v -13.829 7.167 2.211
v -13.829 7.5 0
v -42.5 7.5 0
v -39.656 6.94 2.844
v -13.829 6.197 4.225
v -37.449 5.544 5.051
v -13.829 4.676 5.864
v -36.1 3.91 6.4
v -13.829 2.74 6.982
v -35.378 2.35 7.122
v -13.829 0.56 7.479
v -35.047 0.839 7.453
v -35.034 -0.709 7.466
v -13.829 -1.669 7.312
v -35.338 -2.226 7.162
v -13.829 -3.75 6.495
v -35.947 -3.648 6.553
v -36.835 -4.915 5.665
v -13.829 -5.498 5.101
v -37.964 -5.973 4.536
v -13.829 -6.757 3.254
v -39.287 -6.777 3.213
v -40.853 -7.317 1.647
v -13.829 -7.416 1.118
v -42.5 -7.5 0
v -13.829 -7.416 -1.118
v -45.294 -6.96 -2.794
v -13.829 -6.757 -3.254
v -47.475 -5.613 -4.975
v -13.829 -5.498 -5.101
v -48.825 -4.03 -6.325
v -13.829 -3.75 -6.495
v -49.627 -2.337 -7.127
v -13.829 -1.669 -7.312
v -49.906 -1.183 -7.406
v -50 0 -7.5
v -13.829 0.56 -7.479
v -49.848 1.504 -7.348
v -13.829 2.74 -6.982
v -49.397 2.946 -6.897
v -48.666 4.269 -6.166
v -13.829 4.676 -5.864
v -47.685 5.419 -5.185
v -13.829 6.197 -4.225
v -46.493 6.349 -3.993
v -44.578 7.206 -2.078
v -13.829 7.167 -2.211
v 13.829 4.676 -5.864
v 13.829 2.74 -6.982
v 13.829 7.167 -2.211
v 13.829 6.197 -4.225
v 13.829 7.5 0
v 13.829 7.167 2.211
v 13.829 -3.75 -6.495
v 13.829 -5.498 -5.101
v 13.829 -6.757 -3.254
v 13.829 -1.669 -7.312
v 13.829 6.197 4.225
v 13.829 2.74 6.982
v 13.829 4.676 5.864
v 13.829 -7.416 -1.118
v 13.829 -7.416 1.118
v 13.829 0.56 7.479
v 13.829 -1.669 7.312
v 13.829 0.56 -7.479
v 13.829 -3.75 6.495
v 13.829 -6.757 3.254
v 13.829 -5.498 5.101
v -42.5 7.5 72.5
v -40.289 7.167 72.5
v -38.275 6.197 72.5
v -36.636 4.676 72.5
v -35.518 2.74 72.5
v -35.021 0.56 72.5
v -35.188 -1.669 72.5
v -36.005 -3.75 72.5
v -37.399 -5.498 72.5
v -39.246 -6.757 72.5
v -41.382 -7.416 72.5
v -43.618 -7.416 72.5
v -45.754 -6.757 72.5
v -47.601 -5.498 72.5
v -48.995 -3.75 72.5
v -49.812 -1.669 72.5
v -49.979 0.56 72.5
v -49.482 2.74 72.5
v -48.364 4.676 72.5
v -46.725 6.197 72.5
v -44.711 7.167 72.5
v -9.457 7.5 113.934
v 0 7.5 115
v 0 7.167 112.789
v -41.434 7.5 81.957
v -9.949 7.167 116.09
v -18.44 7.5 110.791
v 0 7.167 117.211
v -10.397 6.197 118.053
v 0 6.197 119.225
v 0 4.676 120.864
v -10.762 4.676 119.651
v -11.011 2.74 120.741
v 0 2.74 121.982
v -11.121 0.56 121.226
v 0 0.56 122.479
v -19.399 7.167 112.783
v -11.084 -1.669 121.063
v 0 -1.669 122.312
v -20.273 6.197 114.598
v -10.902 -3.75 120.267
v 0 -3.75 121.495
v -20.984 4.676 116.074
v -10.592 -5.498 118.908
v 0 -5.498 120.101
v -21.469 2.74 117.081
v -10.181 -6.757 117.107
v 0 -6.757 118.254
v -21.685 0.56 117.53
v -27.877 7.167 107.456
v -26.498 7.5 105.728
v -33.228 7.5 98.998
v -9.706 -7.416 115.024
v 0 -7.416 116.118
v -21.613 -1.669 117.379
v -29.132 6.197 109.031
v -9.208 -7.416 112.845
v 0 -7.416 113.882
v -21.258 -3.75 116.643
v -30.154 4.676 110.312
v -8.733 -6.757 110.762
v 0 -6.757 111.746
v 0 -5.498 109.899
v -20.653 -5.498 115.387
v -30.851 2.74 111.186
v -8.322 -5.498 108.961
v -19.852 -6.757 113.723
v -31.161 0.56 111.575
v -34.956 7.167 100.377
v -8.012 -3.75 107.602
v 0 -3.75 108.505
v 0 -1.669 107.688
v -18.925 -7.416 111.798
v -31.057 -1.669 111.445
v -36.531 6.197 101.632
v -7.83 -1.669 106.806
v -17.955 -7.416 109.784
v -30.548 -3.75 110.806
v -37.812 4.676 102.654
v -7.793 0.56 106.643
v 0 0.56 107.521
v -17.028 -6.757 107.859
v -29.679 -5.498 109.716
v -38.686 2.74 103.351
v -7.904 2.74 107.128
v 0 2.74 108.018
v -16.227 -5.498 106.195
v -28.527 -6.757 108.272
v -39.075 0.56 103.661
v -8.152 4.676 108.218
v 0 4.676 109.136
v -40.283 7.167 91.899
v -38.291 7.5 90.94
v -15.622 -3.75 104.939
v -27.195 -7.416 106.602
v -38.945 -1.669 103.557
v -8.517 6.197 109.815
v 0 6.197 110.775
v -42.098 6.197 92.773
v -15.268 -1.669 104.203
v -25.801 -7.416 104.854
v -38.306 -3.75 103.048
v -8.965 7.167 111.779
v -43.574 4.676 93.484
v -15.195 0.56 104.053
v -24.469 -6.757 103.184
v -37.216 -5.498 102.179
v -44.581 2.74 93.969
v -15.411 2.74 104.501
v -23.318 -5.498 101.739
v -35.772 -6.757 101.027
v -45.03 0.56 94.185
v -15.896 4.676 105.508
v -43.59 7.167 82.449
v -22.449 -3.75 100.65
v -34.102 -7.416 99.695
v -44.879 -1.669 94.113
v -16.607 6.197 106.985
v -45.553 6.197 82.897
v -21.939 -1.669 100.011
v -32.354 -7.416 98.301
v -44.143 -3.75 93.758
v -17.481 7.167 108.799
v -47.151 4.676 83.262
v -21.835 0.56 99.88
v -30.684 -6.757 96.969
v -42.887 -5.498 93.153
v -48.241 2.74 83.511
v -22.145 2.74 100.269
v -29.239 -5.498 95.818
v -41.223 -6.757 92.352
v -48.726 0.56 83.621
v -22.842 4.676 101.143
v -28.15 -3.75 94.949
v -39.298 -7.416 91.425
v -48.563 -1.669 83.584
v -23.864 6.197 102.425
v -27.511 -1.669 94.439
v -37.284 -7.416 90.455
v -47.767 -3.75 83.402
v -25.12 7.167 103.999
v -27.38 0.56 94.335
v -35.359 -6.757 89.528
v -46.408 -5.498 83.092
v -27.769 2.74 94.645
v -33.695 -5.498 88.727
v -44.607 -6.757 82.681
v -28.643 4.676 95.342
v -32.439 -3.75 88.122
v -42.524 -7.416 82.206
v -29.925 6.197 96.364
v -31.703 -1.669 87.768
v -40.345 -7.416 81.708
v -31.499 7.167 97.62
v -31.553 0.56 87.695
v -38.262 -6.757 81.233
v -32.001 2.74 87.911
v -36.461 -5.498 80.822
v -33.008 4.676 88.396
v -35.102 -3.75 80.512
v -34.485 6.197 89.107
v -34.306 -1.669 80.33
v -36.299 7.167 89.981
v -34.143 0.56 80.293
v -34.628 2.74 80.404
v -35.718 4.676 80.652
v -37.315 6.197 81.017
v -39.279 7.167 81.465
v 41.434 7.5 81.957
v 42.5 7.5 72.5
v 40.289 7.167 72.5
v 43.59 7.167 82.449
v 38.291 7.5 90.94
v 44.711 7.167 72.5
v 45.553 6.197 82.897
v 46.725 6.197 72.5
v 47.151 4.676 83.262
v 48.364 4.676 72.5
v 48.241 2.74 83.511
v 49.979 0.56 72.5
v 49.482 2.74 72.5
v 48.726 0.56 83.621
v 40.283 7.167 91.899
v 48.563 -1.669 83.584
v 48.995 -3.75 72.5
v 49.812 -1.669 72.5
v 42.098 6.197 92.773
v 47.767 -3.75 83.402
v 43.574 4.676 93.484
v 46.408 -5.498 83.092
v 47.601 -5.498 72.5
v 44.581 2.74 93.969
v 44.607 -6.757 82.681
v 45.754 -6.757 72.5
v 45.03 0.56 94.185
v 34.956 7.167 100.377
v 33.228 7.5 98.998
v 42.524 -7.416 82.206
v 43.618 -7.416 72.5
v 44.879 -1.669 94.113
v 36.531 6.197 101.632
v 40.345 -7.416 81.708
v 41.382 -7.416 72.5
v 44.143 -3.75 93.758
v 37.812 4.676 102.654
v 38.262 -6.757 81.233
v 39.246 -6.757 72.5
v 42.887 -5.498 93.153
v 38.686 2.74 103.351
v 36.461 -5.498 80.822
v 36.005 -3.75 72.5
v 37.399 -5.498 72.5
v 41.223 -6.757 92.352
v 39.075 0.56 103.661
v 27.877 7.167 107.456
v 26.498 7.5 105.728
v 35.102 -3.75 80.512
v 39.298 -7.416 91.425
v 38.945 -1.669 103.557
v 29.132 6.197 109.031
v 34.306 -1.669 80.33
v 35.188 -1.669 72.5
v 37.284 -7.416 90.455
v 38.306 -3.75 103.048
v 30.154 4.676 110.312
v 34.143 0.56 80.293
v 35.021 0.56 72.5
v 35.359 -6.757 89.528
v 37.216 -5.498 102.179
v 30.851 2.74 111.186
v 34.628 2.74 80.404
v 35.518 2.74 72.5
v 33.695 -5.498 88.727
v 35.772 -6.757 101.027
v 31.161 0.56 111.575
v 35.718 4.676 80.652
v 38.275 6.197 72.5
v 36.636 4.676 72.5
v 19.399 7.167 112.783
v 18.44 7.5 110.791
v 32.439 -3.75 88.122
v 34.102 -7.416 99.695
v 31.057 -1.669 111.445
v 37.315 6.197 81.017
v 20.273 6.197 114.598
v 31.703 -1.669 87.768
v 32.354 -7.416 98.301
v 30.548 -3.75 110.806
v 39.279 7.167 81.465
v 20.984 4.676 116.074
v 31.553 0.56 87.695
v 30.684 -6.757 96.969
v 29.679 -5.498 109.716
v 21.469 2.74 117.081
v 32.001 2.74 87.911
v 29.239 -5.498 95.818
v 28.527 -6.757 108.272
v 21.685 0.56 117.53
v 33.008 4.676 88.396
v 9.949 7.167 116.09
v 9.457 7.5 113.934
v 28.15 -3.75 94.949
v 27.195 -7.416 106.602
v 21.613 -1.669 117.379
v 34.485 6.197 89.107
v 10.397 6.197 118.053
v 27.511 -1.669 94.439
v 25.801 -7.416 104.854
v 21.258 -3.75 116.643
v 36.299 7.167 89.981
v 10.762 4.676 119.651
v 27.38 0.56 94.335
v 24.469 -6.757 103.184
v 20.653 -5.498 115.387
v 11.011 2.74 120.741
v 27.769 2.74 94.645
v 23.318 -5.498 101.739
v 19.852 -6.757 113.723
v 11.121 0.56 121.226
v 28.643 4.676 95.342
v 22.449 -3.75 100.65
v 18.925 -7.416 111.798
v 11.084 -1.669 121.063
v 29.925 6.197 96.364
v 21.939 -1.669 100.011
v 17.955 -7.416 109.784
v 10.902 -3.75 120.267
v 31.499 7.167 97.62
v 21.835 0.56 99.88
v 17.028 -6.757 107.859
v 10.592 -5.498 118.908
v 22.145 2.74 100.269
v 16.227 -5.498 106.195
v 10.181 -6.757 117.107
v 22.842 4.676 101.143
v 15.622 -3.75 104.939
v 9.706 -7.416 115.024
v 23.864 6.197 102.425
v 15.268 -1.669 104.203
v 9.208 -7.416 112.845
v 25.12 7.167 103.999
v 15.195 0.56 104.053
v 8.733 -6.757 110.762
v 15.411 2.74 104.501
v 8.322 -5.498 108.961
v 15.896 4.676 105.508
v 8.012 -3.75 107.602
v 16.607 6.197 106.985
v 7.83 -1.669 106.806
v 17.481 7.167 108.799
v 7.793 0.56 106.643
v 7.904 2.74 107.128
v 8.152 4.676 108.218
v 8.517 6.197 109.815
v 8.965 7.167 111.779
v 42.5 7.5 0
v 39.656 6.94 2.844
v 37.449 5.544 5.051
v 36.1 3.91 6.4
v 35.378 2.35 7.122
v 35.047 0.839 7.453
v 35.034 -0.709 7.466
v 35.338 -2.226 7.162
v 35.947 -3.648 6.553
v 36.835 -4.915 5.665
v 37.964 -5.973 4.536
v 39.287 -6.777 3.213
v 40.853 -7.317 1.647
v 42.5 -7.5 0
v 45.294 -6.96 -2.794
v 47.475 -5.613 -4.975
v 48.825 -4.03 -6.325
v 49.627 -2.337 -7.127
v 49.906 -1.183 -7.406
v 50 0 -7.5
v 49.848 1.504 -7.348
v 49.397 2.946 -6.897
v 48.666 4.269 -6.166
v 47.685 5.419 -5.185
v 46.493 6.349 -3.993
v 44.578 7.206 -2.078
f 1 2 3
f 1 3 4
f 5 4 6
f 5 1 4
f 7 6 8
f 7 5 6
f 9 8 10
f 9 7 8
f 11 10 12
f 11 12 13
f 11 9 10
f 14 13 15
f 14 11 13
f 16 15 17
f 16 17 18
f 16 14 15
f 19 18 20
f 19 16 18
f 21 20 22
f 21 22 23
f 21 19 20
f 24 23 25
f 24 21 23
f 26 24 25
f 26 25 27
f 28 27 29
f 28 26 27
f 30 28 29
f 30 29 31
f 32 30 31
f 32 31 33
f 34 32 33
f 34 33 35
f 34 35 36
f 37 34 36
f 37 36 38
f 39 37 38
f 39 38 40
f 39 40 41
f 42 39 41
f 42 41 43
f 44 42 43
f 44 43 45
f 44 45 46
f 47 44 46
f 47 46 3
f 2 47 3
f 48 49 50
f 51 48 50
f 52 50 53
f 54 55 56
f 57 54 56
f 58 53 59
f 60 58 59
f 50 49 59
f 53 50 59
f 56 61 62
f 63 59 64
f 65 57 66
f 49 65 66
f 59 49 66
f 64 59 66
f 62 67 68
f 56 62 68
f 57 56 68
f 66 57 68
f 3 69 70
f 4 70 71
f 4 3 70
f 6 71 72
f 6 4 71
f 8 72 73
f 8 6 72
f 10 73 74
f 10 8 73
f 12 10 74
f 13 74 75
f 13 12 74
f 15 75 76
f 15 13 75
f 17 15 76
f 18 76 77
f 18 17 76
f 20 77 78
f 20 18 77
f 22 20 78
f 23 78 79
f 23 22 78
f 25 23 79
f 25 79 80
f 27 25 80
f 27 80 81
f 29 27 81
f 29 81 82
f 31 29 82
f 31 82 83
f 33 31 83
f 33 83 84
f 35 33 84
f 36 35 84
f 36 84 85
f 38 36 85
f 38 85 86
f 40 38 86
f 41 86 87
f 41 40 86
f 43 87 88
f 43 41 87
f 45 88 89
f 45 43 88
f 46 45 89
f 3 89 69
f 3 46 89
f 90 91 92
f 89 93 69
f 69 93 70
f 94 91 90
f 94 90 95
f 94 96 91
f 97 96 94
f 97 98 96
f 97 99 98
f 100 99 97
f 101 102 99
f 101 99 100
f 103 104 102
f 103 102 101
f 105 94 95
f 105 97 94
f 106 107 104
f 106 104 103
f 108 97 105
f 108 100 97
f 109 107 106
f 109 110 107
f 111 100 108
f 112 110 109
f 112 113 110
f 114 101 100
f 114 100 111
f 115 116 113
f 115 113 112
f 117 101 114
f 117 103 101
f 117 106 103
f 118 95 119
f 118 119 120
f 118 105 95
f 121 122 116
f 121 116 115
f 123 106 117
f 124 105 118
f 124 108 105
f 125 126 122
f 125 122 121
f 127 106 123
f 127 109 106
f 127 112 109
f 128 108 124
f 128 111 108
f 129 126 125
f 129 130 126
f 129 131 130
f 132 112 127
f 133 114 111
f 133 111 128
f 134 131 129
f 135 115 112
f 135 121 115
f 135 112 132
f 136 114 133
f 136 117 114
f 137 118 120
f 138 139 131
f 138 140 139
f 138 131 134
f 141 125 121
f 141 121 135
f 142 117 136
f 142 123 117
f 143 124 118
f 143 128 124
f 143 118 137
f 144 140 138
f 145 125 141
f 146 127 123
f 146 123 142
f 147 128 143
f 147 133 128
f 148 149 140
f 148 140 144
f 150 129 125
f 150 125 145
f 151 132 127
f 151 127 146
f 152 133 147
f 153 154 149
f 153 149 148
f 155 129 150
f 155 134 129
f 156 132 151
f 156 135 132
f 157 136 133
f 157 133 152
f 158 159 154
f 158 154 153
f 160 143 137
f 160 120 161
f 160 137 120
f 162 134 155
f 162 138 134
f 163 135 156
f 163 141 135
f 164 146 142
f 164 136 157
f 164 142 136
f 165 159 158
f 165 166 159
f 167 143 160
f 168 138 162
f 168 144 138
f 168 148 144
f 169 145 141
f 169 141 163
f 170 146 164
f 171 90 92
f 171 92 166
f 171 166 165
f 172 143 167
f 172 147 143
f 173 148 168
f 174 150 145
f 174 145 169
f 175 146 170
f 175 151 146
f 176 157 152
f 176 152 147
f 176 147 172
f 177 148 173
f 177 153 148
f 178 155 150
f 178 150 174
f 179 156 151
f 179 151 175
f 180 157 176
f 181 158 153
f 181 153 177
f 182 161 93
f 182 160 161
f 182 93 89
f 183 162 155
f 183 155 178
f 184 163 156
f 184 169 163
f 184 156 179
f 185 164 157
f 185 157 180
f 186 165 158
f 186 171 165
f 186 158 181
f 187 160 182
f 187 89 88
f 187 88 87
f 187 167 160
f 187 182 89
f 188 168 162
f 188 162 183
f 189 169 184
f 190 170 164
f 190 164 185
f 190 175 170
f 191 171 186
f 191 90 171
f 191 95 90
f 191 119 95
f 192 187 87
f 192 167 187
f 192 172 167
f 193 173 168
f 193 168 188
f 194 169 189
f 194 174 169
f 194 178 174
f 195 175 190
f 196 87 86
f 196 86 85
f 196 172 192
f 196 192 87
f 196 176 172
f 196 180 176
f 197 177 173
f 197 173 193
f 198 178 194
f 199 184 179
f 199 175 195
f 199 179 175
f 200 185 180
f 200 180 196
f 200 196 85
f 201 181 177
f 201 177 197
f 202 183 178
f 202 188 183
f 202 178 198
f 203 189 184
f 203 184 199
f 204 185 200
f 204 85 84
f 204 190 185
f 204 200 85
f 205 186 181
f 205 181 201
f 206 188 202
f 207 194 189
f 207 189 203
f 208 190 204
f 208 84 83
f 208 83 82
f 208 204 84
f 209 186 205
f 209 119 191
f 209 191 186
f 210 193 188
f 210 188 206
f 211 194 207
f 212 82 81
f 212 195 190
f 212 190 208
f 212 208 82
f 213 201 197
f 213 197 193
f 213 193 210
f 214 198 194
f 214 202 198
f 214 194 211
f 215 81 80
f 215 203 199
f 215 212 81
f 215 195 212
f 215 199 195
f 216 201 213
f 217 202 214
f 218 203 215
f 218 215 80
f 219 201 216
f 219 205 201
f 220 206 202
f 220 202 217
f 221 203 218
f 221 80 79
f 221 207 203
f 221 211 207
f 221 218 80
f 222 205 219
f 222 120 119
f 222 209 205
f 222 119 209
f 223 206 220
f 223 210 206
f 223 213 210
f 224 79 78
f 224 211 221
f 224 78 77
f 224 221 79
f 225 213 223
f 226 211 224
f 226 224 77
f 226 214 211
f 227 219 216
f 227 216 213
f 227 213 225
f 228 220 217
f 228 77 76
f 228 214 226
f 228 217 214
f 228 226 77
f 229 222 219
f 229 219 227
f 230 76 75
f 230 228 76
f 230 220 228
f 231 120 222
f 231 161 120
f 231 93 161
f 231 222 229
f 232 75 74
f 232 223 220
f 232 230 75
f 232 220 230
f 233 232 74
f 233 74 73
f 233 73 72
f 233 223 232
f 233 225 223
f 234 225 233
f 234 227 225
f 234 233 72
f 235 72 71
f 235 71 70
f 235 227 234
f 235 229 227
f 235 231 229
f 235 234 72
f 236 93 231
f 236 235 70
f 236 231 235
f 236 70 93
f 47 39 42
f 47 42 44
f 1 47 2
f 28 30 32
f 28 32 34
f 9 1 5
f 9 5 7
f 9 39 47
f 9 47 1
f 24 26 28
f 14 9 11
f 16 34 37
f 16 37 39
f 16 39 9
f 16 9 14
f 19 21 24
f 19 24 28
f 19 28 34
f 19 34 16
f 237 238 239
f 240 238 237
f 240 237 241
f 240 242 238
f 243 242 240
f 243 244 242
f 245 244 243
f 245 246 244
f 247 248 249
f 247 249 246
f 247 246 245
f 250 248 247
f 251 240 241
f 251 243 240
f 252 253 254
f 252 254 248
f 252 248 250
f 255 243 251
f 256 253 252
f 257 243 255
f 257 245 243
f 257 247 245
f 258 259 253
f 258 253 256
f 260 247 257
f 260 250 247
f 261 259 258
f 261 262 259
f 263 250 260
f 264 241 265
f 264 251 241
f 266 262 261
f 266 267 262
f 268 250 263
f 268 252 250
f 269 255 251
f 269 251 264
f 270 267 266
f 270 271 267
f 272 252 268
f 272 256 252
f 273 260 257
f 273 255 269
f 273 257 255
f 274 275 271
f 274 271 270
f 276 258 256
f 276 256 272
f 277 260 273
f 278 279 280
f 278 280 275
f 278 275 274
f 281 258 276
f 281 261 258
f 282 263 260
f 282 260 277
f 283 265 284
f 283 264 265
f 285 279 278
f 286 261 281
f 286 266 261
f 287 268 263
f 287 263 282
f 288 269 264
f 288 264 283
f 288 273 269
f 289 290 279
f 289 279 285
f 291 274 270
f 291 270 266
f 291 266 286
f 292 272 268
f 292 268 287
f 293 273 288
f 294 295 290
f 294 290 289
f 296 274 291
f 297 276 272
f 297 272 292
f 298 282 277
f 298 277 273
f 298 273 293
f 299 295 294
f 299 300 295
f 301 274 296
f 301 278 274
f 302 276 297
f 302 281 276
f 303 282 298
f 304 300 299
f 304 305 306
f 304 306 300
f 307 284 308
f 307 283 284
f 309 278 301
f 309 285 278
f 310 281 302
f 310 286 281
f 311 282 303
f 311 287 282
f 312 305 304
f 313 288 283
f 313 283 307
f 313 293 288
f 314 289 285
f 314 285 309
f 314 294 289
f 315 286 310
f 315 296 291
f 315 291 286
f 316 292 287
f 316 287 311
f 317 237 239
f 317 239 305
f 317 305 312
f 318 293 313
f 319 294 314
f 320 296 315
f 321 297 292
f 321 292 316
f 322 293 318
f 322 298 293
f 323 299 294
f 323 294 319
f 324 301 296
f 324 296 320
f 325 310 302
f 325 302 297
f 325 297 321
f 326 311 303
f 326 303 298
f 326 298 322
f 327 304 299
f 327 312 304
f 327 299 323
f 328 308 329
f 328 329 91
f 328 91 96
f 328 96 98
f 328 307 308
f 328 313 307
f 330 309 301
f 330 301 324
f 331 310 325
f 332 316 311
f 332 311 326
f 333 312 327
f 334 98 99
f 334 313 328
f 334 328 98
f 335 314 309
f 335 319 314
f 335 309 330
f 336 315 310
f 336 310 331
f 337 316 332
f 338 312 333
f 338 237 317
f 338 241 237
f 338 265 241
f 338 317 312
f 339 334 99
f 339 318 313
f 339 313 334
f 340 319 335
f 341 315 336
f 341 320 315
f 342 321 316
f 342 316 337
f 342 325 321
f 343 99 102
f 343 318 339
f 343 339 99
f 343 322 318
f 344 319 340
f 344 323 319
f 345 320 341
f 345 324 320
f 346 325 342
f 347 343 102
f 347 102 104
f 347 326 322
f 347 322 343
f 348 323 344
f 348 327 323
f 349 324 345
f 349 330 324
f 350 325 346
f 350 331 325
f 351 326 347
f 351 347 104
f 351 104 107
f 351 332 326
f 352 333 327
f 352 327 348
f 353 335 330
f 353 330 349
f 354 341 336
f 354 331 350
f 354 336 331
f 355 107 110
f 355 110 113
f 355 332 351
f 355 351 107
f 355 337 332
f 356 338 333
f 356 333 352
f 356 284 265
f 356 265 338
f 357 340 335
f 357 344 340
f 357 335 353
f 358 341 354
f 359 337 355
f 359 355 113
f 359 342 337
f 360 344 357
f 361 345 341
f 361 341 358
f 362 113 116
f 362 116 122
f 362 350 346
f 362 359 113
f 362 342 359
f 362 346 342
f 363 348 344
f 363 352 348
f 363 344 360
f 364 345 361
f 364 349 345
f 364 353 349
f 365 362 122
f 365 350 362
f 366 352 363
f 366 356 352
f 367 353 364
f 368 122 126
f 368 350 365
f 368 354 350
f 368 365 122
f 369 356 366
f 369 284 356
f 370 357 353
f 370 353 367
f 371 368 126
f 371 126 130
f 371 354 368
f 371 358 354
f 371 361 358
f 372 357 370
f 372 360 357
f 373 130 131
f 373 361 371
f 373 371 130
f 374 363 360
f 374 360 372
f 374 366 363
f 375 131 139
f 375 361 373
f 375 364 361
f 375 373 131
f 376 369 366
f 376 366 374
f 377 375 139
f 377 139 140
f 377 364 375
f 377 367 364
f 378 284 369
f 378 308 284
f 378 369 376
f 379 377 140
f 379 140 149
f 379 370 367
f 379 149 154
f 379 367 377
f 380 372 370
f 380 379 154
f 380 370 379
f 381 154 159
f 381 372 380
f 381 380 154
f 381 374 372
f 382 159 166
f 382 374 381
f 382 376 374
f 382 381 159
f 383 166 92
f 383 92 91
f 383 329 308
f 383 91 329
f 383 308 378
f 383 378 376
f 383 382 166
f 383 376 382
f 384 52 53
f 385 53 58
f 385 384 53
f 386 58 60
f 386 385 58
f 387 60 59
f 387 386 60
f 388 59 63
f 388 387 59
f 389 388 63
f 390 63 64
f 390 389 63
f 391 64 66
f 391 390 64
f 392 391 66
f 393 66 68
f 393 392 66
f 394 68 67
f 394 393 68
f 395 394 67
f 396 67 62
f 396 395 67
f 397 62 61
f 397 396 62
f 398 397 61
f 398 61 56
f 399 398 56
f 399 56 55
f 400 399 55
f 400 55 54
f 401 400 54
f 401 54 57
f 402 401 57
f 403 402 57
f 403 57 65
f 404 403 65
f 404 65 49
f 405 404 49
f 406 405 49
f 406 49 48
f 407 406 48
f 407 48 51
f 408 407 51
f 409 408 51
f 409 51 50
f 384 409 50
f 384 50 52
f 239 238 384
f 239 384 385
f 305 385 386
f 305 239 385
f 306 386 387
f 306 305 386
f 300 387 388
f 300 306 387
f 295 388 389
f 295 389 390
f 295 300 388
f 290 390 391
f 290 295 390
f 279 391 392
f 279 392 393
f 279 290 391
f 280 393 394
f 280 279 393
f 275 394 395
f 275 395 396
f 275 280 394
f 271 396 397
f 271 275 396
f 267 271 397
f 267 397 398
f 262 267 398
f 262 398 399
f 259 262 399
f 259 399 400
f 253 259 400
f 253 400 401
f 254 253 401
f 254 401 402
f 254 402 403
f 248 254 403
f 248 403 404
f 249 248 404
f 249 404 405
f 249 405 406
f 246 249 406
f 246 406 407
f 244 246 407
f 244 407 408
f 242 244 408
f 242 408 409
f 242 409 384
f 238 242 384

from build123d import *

# Parameters (mm, degrees)
F2_R = 7.5


with BuildPart() as f3:
    # F3: sweep along a path in F0
    with BuildLine(Plane.XZ) as f3_path:
        Line((13.8293646224, 0), (42.5, 0))
        Line((42.5, 0), (42.5, 72.5))
        ThreePointArc((42.5, 72.5), (30.0520382004, 102.5520382004), (0, 115))
        ThreePointArc((0, 115), (-30.0520382004, 102.5520382004), (-42.5, 72.5))
        Line((-42.5, 72.5), (-42.5, 0))
        Line((-42.5, 0), (-13.8293646224, 0))
    # F2 (on plane+point) → F3 (sweep)
    with BuildSketch(Plane.YZ.offset(-13.8293646224)):
        Circle(F2_R)
    sweep(path=f3_path.line, transition=Transition.RIGHT)


solid = f3.part
